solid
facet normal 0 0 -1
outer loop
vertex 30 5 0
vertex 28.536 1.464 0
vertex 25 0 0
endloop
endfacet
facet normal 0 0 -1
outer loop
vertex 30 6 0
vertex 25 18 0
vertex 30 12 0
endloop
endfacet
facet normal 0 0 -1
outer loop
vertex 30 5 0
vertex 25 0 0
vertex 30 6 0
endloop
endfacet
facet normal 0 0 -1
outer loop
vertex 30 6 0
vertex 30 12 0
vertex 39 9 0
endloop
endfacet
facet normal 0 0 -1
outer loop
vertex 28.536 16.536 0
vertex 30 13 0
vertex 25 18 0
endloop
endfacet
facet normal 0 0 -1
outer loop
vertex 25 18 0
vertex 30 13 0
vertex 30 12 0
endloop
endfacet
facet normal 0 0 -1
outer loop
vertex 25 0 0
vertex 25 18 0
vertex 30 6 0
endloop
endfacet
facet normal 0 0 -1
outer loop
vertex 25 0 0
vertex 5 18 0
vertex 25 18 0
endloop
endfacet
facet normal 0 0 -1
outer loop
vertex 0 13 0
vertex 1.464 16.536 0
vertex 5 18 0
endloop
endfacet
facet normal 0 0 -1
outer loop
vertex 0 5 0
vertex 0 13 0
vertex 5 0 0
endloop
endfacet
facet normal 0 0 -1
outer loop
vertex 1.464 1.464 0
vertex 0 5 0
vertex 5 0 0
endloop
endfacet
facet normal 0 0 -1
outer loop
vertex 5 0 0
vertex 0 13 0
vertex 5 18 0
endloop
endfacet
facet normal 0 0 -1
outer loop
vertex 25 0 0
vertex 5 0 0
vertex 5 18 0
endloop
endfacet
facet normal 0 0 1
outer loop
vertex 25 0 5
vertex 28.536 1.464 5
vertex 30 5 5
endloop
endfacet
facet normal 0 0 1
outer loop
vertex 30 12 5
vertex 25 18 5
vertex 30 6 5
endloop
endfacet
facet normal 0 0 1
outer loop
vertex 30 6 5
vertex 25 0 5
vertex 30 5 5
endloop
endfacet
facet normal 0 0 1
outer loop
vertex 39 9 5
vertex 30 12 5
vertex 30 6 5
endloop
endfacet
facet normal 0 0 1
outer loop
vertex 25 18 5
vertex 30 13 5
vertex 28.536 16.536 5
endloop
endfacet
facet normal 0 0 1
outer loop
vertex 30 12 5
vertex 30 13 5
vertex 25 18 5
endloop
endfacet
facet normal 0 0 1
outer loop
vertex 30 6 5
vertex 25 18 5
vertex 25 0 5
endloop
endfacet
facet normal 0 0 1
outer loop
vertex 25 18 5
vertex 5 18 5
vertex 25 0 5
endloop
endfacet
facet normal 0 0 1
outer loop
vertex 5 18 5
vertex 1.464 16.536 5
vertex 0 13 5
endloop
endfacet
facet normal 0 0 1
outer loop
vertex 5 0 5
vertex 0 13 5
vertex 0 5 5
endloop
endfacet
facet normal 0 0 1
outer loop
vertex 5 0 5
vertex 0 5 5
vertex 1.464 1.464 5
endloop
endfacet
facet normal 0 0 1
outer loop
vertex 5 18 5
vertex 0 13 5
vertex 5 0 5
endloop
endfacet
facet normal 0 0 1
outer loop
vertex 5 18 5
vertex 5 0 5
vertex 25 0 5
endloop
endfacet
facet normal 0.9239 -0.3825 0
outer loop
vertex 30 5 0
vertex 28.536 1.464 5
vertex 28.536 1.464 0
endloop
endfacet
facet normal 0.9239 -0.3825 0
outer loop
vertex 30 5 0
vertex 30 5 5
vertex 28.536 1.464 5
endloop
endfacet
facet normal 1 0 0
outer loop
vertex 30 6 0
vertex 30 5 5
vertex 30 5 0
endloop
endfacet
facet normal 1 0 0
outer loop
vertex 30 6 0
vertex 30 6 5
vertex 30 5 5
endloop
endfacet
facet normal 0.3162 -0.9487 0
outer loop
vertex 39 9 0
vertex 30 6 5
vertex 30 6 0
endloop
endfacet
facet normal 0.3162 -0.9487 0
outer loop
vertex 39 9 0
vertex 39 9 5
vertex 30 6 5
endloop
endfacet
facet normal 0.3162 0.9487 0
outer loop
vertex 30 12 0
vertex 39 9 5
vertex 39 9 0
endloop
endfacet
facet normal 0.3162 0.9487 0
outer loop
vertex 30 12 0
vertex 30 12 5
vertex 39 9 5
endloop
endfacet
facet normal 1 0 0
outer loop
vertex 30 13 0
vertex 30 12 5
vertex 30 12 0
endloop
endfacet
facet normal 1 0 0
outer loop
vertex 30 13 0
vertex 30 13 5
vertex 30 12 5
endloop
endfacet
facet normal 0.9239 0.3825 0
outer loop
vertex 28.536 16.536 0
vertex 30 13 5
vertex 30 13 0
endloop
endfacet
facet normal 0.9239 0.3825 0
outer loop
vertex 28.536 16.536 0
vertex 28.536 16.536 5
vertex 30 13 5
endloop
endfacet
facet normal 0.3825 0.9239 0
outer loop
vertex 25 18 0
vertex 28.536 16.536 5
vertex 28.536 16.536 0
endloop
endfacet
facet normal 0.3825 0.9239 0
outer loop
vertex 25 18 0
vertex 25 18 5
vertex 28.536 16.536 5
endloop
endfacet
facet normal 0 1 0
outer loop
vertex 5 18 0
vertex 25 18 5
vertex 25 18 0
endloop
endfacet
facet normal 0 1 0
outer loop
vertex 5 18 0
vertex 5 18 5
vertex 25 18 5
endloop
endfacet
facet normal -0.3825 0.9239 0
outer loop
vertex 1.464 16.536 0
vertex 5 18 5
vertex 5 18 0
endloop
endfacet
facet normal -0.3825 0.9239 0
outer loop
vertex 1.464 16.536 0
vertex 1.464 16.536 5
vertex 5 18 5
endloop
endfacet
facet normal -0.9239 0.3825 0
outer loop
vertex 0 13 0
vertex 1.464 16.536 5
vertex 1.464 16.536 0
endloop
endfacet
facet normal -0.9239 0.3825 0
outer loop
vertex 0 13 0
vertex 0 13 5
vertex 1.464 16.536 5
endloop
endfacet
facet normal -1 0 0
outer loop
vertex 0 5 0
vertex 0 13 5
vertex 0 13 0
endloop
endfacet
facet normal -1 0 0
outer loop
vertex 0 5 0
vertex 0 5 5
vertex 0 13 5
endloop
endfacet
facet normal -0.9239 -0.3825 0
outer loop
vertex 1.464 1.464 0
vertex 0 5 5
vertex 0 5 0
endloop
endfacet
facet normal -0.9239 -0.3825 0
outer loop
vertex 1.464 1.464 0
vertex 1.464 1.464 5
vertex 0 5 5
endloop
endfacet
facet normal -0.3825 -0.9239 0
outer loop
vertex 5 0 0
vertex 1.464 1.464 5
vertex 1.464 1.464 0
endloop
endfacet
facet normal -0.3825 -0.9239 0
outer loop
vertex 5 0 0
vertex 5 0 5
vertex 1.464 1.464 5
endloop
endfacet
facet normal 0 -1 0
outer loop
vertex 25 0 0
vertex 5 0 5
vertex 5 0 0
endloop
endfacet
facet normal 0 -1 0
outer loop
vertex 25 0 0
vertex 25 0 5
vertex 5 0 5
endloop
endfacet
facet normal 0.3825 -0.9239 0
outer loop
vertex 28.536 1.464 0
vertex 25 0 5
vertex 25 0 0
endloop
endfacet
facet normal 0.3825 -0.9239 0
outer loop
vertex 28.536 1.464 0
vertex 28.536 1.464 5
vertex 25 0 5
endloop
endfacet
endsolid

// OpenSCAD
$fn = 32;

// ----------------------------------------------------------------------
// Ratchet pawl: 30 x 18 mm body, beak 9 mm с правого торца
// ----------------------------------------------------------------------

// --- parameters (mm) ---
profile_height = 5;       // extrusion height
profile_points = 15;      // points of the closed outline

profile = [[0, 5], [1.464, 1.464], [5, 0], [25, 0], [28.536, 1.464], [30, 5], [30, 6], [39, 9], [30, 12], [30, 13], [28.536, 16.536], [25, 18], [5, 18], [1.464, 16.536], [0, 13]];  // single closed polygon, 15 points, counter clockwise

// --- the one profile operation ---
linear_extrude(height = profile_height) polygon(points = profile);
